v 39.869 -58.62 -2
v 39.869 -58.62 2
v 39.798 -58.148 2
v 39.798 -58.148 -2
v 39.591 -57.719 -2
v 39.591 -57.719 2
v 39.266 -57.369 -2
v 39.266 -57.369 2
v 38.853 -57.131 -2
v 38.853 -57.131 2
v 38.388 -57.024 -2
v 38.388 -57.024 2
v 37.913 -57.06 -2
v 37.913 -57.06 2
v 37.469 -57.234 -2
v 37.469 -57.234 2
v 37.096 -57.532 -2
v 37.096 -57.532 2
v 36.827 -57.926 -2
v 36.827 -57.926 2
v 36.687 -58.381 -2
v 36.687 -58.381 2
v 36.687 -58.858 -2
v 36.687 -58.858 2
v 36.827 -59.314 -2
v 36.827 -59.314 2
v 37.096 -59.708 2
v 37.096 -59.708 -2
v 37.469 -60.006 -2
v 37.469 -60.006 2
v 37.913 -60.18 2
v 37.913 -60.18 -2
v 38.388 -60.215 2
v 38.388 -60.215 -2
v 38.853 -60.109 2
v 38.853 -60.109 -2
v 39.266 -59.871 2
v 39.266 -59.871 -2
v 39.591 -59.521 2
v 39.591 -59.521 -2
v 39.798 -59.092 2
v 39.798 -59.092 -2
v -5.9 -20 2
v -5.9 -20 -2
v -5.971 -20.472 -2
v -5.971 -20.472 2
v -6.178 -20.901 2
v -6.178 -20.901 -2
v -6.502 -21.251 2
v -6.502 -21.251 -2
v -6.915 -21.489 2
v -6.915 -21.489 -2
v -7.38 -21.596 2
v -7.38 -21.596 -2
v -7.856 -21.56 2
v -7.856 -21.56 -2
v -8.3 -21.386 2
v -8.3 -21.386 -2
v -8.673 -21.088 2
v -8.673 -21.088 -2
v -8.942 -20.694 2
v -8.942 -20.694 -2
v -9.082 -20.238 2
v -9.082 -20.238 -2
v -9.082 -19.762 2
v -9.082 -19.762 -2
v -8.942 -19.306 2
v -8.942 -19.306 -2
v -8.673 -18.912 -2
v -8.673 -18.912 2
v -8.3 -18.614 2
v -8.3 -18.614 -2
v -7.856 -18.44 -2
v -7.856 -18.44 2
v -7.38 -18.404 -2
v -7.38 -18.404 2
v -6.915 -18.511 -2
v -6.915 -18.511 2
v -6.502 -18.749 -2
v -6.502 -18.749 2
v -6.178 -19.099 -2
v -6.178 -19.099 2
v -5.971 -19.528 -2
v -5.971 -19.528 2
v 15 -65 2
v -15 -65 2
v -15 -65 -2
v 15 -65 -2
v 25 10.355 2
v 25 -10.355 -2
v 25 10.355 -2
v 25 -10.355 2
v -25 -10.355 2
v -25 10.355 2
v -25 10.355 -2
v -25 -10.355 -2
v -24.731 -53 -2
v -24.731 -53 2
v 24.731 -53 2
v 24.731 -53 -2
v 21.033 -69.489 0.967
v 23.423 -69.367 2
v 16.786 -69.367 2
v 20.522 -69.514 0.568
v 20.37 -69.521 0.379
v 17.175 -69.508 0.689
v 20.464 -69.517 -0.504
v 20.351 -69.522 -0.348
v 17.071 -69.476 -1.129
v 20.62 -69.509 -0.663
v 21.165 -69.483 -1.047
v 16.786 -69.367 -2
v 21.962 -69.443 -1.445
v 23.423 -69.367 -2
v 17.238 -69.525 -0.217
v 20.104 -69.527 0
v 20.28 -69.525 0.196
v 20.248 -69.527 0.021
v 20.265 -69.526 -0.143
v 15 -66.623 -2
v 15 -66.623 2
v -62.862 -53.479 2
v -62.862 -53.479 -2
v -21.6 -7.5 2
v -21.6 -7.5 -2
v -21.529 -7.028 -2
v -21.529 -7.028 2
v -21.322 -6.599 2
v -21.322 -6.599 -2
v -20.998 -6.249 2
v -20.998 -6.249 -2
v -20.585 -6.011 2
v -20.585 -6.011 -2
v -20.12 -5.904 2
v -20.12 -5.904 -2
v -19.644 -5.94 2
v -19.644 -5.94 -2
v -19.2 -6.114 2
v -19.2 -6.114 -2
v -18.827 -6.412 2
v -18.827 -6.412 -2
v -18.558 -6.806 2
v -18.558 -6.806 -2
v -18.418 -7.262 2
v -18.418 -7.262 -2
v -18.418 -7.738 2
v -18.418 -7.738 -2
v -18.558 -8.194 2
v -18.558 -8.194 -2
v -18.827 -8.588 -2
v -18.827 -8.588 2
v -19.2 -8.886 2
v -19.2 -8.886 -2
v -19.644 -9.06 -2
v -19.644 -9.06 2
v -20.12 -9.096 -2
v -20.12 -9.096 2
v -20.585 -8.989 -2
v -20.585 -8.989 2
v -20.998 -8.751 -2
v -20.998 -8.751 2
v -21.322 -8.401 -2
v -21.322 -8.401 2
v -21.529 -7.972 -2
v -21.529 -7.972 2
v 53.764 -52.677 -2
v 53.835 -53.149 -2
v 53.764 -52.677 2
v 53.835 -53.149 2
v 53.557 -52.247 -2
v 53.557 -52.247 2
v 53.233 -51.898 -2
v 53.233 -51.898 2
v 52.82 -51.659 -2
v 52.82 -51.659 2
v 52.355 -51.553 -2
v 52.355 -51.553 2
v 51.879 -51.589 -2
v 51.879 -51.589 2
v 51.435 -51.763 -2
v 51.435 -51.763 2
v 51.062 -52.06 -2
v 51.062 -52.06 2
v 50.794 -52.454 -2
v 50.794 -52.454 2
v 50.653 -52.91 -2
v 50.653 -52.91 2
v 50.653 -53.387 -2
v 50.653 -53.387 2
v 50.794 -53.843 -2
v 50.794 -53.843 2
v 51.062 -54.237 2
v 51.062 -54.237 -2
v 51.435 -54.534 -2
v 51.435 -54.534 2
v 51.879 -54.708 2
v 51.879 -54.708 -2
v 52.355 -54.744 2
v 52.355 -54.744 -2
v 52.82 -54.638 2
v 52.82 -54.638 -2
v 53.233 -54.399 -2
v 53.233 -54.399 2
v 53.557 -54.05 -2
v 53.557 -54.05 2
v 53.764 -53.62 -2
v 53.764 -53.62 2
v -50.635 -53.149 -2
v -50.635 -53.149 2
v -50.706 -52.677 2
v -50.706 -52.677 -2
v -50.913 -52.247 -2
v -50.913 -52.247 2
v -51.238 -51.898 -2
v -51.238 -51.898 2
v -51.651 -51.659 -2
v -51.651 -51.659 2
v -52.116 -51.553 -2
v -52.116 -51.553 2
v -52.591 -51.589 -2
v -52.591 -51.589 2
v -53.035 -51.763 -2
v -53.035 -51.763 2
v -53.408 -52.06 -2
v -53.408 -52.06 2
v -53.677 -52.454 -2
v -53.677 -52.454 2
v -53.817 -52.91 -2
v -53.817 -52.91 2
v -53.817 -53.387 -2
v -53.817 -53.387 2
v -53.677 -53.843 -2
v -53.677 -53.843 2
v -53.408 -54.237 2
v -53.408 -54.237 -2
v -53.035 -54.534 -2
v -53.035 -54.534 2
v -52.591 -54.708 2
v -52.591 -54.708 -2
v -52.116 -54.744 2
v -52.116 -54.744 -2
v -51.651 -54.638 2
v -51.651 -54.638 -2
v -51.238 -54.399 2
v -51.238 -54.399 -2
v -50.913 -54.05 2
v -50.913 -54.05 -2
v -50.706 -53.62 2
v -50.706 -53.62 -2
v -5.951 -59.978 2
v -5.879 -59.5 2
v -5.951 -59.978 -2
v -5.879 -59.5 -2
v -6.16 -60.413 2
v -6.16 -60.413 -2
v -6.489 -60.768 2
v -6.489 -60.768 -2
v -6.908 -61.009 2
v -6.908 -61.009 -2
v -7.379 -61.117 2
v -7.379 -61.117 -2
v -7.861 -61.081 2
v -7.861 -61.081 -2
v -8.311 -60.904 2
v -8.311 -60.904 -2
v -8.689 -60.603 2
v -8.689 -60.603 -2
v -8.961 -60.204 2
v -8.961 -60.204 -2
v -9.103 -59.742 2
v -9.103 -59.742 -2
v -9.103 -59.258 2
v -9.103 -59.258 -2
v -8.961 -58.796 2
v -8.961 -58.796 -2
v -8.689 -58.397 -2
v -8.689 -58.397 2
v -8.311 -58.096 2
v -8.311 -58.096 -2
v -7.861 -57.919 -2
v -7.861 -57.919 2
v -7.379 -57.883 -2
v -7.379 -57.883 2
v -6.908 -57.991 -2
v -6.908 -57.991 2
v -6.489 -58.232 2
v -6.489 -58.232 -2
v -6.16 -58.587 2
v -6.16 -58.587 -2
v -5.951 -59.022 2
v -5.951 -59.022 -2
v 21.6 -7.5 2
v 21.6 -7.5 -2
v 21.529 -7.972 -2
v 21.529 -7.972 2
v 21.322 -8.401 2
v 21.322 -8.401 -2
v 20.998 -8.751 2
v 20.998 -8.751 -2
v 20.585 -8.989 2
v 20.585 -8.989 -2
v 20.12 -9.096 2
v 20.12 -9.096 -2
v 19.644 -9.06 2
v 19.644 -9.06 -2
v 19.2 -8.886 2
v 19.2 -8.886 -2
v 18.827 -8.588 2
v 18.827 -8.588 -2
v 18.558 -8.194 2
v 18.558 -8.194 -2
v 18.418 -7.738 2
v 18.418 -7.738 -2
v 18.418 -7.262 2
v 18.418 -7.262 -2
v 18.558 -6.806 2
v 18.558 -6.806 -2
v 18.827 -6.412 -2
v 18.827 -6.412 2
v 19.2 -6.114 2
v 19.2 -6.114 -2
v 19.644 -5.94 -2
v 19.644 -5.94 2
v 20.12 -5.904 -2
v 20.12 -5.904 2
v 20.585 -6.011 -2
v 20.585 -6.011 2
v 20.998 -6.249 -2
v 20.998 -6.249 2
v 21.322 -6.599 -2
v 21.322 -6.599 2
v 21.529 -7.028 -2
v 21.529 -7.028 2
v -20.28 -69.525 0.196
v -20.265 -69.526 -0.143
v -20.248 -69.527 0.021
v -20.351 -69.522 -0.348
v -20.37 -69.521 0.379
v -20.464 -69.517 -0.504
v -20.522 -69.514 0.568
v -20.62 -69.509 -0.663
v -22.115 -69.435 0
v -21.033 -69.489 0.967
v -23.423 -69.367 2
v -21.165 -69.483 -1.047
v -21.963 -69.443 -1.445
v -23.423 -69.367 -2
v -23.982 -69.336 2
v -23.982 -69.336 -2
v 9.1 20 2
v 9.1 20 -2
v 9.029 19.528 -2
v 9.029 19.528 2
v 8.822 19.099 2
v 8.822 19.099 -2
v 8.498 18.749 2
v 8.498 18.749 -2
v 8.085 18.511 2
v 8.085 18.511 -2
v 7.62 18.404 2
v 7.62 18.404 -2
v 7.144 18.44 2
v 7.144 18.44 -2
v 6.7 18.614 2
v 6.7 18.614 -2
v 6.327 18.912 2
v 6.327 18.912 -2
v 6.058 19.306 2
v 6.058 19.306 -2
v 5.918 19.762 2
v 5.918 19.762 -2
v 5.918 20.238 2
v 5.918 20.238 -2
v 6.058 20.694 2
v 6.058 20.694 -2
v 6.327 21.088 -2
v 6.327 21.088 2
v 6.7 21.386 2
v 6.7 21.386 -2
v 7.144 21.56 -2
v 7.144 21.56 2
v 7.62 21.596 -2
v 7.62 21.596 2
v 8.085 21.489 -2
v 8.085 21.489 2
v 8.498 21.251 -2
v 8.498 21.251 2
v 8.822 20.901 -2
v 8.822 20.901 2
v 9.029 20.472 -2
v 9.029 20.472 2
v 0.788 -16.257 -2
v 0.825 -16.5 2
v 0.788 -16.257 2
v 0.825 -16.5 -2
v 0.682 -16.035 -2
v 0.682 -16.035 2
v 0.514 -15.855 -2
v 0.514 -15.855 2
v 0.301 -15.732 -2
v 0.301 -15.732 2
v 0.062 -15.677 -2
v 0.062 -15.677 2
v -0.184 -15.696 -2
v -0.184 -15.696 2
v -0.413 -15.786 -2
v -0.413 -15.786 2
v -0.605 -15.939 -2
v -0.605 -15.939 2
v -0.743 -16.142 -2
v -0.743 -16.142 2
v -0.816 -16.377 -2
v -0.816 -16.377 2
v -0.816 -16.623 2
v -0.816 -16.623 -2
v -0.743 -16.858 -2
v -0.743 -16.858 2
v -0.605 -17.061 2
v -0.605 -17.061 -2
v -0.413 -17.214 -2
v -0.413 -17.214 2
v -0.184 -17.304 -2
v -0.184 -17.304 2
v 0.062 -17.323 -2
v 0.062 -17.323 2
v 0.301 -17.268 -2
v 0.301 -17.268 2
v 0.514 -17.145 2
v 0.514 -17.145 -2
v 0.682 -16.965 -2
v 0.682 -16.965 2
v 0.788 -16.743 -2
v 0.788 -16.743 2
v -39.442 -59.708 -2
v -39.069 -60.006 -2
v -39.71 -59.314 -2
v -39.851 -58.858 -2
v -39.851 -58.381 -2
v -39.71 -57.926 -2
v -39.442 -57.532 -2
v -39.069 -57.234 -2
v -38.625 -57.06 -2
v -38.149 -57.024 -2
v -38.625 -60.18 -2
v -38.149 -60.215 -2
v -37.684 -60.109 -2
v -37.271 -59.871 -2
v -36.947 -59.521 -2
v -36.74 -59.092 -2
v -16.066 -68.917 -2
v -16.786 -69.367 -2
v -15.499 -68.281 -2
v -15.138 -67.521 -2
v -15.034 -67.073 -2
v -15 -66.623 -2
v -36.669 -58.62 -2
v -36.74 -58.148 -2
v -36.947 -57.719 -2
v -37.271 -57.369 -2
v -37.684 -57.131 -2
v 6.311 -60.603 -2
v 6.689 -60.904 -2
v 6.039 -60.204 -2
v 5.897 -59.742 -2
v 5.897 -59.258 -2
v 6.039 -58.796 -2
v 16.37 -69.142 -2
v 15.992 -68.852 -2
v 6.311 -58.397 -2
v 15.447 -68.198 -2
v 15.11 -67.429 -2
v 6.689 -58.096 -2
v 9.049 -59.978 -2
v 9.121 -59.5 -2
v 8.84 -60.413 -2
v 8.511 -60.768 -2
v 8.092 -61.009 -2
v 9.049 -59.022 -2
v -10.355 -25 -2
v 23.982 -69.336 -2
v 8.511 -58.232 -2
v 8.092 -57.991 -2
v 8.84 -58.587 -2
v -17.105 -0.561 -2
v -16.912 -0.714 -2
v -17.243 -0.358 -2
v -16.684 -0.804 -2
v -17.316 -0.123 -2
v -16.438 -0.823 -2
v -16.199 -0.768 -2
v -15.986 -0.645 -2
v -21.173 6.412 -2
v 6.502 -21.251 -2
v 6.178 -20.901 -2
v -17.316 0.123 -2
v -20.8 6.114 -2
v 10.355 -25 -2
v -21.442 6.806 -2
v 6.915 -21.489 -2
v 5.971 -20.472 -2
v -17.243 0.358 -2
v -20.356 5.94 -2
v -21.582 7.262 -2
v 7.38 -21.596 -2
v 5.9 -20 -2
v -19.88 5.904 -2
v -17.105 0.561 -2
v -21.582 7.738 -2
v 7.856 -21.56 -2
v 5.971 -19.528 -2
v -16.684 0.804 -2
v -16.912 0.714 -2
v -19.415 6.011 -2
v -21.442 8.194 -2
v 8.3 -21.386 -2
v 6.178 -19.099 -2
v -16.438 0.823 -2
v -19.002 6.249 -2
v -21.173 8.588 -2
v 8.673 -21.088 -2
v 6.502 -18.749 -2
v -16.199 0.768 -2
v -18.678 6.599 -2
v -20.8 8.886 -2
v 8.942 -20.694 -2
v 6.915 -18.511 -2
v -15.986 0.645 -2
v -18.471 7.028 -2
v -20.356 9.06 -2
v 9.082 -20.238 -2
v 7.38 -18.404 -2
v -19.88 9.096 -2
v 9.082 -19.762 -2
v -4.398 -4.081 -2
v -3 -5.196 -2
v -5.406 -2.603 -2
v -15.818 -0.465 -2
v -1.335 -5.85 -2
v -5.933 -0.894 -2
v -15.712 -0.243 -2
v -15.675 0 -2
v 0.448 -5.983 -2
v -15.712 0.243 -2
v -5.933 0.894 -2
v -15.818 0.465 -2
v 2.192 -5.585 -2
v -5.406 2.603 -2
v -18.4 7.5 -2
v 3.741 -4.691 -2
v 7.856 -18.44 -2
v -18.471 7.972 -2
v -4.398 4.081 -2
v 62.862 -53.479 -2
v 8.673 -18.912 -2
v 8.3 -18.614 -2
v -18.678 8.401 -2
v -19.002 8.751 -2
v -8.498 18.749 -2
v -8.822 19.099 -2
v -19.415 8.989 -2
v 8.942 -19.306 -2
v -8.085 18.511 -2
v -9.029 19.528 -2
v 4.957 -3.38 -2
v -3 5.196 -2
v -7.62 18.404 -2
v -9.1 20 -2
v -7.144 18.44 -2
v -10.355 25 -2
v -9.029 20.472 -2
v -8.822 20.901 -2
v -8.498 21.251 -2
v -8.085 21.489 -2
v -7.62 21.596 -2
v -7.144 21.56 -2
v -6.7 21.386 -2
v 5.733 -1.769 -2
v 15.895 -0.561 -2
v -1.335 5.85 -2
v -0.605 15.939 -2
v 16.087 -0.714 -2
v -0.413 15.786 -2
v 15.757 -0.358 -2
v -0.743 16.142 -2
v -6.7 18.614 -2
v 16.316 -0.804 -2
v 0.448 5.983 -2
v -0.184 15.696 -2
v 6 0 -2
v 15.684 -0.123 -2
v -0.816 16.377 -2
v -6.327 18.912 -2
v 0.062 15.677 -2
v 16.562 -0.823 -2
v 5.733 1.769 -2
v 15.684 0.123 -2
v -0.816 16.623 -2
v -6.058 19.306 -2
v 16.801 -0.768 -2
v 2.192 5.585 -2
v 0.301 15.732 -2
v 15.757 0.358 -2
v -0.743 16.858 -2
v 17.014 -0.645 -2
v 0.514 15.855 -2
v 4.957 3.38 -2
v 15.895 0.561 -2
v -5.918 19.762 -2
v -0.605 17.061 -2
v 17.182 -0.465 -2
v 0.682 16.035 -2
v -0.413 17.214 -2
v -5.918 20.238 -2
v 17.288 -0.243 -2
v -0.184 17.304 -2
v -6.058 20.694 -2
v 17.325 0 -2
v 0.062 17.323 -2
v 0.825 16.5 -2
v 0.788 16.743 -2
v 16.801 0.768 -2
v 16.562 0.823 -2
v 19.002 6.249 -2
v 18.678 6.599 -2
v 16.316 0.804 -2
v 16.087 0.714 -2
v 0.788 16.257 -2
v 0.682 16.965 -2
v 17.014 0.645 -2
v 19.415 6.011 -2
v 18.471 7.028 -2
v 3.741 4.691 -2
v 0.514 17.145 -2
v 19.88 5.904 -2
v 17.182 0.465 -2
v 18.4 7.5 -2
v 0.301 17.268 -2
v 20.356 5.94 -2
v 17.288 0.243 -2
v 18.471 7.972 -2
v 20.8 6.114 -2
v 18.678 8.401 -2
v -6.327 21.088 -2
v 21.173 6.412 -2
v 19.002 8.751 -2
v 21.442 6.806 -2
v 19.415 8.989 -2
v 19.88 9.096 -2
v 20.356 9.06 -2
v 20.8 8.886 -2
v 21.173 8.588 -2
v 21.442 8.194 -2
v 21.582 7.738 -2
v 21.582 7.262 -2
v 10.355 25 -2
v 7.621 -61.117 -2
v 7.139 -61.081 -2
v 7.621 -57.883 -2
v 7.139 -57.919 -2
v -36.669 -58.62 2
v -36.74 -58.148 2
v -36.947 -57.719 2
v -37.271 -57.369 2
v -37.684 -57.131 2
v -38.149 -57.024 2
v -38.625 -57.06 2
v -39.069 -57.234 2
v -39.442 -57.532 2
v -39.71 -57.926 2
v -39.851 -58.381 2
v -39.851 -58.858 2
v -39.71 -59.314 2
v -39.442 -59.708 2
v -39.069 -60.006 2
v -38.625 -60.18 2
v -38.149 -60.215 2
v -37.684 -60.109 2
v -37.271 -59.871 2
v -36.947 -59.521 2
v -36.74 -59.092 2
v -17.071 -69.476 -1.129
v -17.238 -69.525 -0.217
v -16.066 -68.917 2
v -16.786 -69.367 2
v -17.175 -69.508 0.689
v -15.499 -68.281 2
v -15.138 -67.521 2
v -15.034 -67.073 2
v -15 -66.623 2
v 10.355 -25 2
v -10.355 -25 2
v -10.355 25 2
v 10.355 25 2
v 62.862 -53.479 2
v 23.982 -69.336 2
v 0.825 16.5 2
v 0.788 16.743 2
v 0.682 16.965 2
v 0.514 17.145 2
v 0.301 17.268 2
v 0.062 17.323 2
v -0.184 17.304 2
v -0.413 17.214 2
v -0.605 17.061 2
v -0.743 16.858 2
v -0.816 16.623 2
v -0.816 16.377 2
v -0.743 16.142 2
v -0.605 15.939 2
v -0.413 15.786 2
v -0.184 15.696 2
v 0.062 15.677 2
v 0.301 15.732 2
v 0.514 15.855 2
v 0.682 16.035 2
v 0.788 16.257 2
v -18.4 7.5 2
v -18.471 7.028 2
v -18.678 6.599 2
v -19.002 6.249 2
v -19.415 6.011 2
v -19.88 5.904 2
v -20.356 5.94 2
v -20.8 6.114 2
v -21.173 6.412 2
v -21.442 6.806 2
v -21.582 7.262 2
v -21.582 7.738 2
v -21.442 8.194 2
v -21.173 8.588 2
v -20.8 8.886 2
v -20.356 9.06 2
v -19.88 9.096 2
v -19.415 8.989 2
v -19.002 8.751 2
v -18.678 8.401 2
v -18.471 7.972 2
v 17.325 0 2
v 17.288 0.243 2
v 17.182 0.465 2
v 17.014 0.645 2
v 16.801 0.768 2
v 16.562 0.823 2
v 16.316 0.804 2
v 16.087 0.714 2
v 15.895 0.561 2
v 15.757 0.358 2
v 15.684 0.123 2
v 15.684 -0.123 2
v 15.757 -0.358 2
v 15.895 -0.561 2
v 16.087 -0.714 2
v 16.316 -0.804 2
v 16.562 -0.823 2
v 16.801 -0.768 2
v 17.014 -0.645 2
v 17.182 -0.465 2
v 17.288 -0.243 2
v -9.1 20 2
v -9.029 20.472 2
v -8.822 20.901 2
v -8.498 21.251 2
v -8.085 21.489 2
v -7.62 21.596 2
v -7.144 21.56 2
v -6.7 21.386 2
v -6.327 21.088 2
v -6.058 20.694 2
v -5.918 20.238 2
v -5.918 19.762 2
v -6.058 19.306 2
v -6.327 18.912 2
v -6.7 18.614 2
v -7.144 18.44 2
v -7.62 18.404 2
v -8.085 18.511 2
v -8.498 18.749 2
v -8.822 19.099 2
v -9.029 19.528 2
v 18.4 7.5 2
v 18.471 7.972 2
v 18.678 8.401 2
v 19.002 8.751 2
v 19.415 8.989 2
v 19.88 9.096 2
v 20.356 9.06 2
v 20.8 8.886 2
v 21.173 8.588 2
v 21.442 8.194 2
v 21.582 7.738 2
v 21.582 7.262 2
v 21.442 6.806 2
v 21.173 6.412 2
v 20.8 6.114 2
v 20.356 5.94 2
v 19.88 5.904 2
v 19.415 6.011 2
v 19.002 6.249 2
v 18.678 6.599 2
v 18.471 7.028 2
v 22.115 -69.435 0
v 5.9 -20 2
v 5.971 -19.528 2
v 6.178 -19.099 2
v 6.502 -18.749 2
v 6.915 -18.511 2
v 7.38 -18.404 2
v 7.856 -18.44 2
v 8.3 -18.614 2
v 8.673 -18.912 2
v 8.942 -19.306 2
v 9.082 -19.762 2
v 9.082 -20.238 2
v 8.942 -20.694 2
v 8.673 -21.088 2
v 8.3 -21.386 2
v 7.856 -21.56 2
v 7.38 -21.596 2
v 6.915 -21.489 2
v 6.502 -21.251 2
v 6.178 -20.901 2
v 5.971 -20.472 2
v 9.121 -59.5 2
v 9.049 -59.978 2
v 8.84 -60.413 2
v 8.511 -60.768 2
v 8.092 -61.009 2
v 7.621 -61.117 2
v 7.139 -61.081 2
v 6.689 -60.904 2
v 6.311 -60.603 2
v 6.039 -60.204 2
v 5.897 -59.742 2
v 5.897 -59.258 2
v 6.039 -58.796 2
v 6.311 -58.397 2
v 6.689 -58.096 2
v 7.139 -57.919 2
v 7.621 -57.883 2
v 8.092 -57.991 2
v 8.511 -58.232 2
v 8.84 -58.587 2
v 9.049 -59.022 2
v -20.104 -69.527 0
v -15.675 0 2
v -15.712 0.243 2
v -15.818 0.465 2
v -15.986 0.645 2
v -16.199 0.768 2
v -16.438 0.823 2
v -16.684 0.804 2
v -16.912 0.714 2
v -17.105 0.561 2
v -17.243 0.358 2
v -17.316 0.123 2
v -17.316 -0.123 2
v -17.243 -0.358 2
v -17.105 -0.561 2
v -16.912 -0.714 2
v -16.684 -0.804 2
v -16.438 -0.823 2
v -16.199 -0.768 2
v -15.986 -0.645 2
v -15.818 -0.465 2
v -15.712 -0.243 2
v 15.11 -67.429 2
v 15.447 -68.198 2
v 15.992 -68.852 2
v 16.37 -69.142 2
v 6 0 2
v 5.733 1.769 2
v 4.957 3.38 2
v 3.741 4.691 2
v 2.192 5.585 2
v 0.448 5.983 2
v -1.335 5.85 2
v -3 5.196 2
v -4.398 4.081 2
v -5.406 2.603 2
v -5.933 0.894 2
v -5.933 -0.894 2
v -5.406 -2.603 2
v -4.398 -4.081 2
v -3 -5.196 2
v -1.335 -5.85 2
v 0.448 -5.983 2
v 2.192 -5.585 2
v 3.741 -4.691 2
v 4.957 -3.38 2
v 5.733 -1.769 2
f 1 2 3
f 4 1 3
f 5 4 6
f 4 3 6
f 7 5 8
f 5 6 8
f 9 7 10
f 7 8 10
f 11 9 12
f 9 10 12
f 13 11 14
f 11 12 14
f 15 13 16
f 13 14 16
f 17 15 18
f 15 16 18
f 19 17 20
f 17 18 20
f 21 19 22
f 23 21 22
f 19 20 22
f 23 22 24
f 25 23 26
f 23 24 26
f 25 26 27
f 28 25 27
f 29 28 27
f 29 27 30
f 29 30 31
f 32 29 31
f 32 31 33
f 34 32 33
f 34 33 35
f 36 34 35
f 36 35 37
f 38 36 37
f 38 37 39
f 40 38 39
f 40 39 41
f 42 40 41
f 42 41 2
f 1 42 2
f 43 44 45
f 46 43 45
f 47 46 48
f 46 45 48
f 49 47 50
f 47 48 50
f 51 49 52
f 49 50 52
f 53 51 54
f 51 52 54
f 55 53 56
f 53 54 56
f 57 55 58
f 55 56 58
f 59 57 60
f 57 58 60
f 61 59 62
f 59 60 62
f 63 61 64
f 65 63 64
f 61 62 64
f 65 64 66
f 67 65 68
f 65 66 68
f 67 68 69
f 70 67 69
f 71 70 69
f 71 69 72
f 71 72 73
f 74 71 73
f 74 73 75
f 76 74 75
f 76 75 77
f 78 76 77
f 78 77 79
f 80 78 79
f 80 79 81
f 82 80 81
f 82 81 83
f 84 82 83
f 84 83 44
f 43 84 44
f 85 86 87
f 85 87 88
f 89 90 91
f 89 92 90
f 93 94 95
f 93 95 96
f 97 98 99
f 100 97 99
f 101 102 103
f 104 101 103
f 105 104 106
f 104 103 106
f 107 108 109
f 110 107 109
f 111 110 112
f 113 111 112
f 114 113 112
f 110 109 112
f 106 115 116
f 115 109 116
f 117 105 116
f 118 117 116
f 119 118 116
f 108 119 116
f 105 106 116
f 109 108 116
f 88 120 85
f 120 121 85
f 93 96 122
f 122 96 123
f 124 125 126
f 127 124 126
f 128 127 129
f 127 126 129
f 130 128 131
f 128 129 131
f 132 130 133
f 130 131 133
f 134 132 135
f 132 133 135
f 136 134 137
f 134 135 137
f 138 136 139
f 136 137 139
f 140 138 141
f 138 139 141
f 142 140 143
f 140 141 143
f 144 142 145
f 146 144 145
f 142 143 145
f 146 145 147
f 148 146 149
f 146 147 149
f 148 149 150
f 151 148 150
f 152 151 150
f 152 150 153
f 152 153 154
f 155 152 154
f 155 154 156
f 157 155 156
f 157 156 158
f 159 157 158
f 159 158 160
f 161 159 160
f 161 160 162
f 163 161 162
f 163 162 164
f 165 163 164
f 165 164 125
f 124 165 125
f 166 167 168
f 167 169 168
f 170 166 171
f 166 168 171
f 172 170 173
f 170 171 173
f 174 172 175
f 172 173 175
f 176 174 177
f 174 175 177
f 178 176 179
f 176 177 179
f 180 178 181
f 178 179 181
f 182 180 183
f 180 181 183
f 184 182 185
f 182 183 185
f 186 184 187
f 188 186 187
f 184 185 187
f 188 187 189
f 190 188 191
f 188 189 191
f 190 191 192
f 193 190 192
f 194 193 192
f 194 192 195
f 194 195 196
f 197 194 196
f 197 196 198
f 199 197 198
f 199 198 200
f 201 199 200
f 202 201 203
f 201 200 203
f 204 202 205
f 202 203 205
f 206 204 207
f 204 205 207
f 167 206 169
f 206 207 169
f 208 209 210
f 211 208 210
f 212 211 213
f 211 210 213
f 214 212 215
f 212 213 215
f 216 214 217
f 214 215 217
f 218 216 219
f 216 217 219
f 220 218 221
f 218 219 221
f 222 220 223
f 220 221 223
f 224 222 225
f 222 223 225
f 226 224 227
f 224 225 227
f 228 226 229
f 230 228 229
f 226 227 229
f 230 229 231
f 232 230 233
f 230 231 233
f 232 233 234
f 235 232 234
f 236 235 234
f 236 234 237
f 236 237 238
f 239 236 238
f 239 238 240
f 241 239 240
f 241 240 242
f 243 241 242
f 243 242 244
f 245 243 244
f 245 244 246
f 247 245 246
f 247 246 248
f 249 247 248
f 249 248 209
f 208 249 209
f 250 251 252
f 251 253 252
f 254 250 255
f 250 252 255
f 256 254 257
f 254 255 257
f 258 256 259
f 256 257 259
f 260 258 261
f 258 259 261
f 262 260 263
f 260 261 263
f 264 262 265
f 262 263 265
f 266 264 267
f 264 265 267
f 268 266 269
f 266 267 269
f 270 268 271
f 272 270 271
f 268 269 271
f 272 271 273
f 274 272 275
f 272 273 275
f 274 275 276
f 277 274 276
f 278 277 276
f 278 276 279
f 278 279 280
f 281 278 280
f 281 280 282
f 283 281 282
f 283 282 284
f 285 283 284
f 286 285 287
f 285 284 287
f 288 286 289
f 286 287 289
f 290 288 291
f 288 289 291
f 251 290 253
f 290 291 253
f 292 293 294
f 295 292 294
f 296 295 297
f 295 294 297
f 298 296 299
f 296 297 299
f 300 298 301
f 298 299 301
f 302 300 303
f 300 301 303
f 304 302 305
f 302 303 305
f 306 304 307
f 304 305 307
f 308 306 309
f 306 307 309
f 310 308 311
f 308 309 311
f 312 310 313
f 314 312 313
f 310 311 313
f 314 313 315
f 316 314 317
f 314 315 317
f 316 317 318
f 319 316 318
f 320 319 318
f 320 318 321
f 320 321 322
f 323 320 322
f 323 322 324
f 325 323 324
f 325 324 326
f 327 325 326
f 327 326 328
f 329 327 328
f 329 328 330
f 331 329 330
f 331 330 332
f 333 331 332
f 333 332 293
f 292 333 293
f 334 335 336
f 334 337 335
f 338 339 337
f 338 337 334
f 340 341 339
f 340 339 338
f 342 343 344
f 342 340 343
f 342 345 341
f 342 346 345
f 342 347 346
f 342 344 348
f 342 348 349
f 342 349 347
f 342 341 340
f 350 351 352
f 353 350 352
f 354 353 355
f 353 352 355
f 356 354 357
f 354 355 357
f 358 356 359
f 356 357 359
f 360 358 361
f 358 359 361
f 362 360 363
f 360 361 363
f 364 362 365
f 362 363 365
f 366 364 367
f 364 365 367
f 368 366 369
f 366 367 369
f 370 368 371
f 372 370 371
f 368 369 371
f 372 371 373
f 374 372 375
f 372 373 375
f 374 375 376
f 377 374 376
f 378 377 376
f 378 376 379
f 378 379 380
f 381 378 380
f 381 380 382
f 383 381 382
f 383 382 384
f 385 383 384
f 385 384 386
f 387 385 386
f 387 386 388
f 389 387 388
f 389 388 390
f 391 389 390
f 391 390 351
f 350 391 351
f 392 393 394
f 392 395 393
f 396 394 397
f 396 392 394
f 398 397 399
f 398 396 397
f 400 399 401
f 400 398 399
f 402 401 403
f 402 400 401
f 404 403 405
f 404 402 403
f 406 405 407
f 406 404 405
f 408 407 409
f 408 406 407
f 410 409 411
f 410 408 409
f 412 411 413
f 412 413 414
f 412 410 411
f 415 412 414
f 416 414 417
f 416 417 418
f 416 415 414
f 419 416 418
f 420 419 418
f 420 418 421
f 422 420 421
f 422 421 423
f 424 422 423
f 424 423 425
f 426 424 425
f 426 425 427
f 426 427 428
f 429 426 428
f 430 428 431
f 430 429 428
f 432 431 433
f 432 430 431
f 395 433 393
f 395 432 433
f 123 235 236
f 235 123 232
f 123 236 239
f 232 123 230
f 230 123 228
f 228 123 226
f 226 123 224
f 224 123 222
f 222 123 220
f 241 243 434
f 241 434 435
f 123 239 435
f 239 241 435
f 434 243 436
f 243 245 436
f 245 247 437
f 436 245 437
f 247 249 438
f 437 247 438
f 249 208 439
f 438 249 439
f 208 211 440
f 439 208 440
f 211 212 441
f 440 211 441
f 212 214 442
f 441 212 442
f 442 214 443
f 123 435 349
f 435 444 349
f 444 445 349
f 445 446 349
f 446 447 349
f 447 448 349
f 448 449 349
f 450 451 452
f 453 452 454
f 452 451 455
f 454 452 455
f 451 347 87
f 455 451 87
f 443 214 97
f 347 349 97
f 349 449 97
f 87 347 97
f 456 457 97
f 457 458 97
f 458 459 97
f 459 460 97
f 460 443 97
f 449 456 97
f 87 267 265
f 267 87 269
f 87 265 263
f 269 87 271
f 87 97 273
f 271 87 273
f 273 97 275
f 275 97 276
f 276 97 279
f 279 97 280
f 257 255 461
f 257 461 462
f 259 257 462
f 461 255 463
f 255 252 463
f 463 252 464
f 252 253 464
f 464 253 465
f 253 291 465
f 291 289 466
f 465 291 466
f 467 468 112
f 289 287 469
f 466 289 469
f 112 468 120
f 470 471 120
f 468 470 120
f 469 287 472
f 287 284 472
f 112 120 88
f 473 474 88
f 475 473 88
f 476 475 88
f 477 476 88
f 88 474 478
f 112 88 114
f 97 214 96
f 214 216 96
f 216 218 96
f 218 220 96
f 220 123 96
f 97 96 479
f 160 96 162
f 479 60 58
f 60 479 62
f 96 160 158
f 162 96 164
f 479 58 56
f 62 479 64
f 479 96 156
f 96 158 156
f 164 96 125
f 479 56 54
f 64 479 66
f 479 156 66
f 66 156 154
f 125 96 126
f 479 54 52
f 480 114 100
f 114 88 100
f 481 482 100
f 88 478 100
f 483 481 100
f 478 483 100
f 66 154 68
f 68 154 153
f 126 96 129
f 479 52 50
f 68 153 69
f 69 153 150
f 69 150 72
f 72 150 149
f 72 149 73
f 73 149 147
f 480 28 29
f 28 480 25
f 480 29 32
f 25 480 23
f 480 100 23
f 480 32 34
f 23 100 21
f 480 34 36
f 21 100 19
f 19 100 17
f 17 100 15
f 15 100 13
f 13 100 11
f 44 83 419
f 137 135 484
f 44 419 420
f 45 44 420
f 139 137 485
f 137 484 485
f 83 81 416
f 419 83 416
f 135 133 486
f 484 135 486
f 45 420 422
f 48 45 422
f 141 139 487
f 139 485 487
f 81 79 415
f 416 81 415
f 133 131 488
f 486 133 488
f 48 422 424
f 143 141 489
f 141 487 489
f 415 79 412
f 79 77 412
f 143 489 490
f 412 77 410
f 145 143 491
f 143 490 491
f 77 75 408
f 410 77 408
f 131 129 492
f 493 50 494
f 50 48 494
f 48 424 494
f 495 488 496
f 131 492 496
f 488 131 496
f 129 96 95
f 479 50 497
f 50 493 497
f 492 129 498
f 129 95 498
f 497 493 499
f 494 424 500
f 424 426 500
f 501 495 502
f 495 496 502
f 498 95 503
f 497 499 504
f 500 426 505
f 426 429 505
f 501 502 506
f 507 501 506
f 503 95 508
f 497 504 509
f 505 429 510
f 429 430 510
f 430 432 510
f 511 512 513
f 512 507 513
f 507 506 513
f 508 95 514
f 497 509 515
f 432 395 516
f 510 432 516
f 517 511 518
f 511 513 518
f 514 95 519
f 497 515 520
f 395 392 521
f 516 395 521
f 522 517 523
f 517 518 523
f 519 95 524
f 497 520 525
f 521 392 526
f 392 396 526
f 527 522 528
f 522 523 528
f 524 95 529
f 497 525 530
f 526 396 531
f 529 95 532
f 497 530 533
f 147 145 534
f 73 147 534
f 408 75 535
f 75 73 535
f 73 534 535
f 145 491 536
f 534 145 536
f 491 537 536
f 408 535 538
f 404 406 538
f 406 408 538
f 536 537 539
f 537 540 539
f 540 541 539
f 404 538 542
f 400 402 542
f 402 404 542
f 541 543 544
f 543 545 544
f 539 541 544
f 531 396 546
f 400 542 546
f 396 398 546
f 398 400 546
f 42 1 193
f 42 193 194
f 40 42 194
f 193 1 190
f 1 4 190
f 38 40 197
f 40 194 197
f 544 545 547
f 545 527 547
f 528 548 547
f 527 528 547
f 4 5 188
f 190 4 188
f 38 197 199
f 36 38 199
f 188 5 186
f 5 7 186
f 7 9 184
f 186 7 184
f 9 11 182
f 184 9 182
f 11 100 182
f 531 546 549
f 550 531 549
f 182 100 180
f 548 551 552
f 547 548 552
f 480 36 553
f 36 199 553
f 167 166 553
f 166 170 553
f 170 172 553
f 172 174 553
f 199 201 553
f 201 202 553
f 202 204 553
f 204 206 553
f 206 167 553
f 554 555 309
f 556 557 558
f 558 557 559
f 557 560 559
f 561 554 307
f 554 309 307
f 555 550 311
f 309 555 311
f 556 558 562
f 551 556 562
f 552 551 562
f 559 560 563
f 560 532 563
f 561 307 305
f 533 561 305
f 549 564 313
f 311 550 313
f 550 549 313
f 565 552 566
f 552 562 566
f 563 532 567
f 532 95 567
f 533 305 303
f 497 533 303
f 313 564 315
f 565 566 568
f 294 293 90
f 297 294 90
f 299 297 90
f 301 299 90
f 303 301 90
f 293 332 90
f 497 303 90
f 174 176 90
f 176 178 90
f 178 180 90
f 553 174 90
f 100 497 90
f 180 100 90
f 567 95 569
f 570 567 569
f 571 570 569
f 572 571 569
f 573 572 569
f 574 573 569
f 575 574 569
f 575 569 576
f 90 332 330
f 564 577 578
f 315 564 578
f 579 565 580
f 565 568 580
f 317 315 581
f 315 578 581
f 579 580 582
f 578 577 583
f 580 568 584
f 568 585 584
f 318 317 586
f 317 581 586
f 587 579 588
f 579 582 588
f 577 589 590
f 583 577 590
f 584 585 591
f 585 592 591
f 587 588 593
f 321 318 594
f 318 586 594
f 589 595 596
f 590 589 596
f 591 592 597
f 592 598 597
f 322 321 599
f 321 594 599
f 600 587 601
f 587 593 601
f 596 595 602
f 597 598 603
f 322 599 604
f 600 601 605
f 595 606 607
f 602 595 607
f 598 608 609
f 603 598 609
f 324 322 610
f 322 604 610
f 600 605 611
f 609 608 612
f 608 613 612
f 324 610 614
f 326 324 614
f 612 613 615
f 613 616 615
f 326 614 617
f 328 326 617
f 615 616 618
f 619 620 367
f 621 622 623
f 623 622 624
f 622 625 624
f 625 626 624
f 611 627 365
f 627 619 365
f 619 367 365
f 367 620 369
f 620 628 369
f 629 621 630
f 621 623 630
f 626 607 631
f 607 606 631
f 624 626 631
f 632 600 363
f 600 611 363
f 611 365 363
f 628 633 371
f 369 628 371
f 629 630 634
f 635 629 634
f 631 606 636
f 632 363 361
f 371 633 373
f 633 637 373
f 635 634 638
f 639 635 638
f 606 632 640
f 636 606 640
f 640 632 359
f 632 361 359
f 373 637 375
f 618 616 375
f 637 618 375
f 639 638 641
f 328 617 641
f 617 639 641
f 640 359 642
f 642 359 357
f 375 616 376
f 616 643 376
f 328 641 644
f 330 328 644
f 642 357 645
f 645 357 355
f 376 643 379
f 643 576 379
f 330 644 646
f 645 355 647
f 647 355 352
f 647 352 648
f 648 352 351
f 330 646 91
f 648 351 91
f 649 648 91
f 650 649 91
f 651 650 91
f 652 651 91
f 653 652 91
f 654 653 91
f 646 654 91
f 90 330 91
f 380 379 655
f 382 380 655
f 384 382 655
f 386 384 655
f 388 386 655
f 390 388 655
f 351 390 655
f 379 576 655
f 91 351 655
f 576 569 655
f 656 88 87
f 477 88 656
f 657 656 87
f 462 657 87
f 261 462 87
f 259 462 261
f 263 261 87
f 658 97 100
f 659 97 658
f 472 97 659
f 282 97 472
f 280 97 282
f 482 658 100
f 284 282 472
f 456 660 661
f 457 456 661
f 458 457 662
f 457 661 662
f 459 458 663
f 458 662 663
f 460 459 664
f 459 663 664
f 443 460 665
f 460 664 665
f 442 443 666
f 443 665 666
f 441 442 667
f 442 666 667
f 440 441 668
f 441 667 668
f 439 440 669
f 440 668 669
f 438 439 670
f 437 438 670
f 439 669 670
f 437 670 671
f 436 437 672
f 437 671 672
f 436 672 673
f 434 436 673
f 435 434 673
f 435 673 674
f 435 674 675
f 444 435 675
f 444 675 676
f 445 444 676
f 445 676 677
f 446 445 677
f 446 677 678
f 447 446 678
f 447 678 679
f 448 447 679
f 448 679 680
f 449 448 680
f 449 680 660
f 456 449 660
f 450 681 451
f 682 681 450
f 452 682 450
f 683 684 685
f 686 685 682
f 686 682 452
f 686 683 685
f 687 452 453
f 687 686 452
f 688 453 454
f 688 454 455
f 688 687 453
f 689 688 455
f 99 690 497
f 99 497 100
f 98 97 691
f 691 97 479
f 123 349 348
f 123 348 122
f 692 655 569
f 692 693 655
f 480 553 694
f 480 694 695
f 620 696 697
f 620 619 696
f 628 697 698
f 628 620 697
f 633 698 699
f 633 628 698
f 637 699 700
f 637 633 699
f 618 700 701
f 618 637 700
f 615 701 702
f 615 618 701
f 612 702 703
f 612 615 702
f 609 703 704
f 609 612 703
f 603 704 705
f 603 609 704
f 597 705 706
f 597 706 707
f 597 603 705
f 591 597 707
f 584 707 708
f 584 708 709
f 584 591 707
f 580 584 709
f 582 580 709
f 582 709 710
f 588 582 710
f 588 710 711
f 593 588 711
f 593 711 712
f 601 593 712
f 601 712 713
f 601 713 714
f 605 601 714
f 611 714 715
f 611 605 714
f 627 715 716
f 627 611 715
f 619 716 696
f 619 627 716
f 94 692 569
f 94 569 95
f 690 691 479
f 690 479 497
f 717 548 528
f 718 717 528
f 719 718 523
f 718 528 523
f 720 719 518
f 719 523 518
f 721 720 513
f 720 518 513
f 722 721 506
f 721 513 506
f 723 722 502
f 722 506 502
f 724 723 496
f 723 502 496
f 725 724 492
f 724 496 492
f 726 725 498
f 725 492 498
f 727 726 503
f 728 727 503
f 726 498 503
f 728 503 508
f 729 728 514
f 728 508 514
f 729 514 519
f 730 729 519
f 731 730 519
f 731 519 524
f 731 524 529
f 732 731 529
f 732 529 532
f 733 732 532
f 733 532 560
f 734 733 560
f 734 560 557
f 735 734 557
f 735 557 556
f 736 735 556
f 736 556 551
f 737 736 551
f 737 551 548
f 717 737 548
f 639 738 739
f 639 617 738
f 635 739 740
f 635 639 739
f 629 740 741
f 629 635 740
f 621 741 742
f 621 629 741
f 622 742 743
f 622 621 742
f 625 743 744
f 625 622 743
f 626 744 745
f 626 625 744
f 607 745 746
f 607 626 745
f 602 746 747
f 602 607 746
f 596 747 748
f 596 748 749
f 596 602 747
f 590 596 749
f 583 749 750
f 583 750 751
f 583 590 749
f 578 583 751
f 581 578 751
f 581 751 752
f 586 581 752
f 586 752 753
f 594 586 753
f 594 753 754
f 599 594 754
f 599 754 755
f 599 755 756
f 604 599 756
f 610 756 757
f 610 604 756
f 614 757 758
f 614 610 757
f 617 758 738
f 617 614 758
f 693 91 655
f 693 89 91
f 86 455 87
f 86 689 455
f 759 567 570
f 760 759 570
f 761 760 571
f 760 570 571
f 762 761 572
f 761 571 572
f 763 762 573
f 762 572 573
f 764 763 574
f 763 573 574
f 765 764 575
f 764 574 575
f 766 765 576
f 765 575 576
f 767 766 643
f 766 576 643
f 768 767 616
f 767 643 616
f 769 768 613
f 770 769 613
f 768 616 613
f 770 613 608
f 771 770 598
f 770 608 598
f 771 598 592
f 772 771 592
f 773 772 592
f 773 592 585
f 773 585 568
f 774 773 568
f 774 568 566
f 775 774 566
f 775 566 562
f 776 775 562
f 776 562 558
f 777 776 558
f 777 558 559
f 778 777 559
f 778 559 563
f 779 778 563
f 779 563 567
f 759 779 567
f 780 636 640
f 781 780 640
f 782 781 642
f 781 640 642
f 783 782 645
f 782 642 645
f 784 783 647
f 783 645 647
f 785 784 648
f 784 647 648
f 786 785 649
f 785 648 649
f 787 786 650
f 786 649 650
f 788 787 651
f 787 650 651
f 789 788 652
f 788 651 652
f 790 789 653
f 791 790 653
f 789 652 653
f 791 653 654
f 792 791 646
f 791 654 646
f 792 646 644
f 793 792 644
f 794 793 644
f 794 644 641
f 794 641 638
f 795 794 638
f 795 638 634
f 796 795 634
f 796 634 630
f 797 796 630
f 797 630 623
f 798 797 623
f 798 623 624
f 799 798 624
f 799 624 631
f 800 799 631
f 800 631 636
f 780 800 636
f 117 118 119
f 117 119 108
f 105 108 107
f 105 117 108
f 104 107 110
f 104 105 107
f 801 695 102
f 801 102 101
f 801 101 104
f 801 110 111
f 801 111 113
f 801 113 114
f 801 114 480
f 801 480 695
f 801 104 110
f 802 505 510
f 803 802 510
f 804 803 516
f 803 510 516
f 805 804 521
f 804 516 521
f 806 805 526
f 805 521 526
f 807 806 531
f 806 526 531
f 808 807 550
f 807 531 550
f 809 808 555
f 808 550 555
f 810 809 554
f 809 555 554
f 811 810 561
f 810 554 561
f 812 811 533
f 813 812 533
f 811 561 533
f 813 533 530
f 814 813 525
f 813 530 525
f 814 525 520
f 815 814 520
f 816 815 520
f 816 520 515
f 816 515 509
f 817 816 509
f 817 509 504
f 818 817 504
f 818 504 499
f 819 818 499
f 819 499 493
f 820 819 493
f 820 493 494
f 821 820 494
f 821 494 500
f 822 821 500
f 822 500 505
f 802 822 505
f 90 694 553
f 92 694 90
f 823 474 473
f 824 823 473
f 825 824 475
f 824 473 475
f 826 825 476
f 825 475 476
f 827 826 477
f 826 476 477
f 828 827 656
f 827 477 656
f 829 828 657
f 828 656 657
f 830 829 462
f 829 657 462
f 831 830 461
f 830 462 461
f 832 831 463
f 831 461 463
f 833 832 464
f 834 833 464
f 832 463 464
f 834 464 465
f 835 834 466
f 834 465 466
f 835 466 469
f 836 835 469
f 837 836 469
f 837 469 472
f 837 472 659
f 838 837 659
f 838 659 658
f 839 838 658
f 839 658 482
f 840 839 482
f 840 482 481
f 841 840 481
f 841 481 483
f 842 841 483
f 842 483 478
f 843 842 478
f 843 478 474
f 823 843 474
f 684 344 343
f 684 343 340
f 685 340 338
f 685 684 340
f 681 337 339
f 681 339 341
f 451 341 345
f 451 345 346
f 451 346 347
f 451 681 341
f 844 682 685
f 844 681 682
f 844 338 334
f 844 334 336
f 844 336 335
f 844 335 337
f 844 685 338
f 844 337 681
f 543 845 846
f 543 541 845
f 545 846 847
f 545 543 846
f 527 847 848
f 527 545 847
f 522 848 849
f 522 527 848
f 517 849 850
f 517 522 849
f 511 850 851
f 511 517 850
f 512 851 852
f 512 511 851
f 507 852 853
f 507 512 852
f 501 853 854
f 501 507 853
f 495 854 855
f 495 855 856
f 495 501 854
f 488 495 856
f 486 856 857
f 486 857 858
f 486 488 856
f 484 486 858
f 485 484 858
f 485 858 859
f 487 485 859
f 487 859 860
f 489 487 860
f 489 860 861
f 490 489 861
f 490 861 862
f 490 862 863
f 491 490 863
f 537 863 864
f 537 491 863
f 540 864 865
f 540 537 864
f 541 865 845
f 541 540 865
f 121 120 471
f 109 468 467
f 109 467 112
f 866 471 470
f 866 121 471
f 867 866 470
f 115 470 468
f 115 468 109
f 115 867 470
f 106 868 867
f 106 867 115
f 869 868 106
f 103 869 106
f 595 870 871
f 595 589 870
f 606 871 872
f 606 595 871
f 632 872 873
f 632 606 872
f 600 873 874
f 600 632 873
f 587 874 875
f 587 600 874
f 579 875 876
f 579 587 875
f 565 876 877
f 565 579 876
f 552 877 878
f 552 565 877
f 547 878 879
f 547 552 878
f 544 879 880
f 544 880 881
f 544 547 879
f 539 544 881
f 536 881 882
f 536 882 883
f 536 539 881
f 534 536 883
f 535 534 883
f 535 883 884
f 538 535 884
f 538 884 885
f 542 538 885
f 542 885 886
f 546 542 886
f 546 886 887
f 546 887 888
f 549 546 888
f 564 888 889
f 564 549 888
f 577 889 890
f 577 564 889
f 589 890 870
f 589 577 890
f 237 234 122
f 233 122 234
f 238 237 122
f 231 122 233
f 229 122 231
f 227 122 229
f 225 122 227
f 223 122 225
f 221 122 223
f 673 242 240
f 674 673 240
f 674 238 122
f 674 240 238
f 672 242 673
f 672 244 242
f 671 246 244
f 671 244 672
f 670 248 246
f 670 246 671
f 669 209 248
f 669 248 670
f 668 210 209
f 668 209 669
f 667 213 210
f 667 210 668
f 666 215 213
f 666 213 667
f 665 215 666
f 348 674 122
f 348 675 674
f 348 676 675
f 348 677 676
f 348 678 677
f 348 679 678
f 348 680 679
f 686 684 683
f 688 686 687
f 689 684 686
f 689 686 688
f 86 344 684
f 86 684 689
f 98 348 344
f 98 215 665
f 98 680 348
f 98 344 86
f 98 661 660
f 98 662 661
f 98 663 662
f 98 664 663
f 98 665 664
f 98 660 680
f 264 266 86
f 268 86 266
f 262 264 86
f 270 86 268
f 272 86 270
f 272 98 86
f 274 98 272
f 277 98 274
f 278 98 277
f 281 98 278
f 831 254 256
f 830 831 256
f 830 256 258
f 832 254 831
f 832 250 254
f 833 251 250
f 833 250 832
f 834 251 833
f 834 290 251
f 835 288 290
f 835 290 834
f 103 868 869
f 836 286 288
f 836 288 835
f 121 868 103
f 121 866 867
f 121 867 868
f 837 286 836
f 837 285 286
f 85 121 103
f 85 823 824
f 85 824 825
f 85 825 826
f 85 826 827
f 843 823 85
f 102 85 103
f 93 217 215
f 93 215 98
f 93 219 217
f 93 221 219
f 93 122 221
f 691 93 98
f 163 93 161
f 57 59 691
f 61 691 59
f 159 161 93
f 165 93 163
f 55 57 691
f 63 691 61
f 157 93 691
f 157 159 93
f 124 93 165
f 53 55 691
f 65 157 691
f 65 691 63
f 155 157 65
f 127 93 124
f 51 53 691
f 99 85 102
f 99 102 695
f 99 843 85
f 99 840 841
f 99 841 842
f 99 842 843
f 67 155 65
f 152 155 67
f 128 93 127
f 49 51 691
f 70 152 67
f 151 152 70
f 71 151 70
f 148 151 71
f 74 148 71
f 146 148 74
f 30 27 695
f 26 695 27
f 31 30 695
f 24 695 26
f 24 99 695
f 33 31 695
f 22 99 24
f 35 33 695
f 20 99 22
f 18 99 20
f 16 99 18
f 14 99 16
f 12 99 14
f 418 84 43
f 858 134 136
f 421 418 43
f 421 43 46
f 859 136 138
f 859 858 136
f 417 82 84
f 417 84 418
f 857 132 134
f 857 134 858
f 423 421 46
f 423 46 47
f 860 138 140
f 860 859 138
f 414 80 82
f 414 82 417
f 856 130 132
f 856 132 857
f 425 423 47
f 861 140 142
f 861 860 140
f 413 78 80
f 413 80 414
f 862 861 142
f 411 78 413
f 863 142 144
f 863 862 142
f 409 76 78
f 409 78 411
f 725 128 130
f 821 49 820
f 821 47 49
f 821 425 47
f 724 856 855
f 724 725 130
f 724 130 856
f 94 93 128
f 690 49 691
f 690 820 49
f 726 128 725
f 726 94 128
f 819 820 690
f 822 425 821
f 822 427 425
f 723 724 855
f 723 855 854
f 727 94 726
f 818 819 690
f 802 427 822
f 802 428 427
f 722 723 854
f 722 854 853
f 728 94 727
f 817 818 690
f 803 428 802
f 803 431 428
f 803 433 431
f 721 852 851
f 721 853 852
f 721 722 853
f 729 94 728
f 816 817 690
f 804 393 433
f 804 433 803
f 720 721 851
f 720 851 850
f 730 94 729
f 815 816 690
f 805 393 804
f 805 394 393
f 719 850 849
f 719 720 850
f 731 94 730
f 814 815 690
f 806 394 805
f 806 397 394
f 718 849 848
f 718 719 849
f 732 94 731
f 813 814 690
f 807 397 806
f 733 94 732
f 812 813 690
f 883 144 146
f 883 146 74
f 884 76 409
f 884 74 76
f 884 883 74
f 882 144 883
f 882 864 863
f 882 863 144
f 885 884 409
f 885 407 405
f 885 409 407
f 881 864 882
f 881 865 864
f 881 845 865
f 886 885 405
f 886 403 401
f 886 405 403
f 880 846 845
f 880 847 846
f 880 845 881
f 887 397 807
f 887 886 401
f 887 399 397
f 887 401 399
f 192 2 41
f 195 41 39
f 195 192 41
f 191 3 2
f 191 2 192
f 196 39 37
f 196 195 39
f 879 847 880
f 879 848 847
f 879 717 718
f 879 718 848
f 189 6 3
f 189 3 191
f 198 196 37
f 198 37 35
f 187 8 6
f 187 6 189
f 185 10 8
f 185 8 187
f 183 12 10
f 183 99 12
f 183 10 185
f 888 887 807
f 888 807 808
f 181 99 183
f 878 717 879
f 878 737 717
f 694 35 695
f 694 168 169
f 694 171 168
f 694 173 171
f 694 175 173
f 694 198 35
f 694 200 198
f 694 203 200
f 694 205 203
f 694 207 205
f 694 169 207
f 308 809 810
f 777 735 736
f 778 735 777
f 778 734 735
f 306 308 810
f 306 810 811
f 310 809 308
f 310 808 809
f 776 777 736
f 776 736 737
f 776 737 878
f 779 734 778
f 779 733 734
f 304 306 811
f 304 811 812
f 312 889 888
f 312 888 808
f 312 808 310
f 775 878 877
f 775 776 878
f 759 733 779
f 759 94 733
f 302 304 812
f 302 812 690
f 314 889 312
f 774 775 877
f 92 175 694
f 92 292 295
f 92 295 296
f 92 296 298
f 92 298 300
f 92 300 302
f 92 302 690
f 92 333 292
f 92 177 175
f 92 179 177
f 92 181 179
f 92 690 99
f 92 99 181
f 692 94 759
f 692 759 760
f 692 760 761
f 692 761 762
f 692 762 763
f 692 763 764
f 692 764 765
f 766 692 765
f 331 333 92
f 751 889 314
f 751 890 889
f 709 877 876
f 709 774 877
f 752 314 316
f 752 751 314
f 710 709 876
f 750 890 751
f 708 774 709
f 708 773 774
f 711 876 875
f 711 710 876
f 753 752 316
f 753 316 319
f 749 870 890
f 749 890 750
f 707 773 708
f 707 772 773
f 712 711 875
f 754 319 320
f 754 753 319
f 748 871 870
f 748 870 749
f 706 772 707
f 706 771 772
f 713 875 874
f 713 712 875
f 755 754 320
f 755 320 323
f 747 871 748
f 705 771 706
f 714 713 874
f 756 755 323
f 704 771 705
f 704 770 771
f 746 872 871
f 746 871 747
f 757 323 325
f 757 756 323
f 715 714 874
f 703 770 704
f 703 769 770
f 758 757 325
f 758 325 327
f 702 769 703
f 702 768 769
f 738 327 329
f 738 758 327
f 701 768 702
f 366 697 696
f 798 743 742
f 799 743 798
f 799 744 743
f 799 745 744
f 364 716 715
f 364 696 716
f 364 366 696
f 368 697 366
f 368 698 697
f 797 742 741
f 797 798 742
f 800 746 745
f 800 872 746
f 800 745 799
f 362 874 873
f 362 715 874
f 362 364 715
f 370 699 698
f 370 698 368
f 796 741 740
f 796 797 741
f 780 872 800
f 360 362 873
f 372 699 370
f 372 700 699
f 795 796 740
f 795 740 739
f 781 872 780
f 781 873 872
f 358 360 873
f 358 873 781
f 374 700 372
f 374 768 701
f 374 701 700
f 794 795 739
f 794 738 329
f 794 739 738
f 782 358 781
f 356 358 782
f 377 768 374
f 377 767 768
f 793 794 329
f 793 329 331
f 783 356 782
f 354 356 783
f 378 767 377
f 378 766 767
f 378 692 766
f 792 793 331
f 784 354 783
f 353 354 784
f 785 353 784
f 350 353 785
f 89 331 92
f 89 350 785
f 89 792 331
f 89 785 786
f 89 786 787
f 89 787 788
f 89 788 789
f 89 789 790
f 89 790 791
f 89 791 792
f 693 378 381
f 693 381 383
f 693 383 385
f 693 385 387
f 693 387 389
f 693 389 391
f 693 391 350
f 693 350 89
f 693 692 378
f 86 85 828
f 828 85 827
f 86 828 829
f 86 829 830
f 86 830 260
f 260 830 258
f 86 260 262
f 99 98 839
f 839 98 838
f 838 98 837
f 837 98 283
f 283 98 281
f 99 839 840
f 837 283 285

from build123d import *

# Parameters (mm, degrees)
SKETCH_2_R           = 0.825
SKETCH_2_R_2         = 6
EXTRUDE_1_DEPTH      = 2
SKETCH_4_R           = 1.6
CUT_EXTRUDE_1_DEPTH  = 15
EXTRUDE_2_DEPTH      = 2
EXTRUDE_3_DEPTH      = 2
SKETCH_21_W          = 94.174920184
SKETCH_21_H          = 20
EXTRUDE_5_DEPTH      = 4
CUT_EXTRUDE_10_DEPTH = 7
SKETCH_23_W          = 30
SKETCH_23_H          = 8.450093073
CUT_EXTRUDE_11_DEPTH = 7
CHAMFER_START        = -2
CHAMFER_6_DEPTH      = 4
SKETCH_25_R          = 1.6
CUT_EXTRUDE_12_DEPTH = 7
FILLET_3_R           = 3
CUT_EXTRUDE_13_DEPTH = 32
SKETCH_27_R          = 1.621448002
CUT_EXTRUDE_14_DEPTH = 32


with BuildPart() as part:
    # 草图2 → 凸台-拉伸1 (new, symmetric)
    with BuildSketch(Plane.XY):
        Polygon((10.355339059, 25), (-10.355339059, 25), (-25, 10.355339059), (-25, -10.355339059), (-10.355339059, -25), (10.355339059, -25), (25, -10.355339059), (25, 10.355339059), align=None)
        with Locations((-16.5, 0)):
            Circle(SKETCH_2_R, mode=Mode.SUBTRACT)
        with Locations((0, 16.5)):
            Circle(SKETCH_2_R, mode=Mode.SUBTRACT)
        with Locations((16.5, 0)):
            Circle(SKETCH_2_R, mode=Mode.SUBTRACT)
        with Locations((0, -16.5)):
            Circle(SKETCH_2_R, mode=Mode.SUBTRACT)
        Circle(SKETCH_2_R_2, mode=Mode.SUBTRACT)
    extrude(amount=EXTRUDE_1_DEPTH, both=True)

    # 草图4 → 切除-拉伸1 (cut)
    with BuildSketch(Plane(origin=(0, 0, -2), x_dir=(-1, 0, 0), z_dir=(0, 0, -1))):
        with Locations((-7.5, -20)):
            Circle(SKETCH_4_R)
        with Locations(Location((7.5, -20, 0), (0, 0, 180))):
            Circle(SKETCH_4_R)
        with Locations((-20, 7.5)):
            Circle(SKETCH_4_R)
        with Locations(Location((-20, -7.5, 0), (0, 0, 180))):
            Circle(SKETCH_4_R)
        with Locations((7.5, 20)):
            Circle(SKETCH_4_R)
        with Locations(Location((-7.5, 20, 0), (0, 0, 180))):
            Circle(SKETCH_4_R)
        with Locations((20, -7.5)):
            Circle(SKETCH_4_R)
        with Locations(Location((20, 7.5, 0), (0, 0, 180))):
            Circle(SKETCH_4_R)
    extrude(amount=-CUT_EXTRUDE_1_DEPTH, mode=Mode.SUBTRACT)

    # 草图5 → 凸台-拉伸2 (add, symmetric)
    with BuildSketch(Plane.XY):
        Polygon((-25, -10.355339059), (-80, -73), (-60, -73), (-11.17766953, -24.17766953), align=None)
        Polygon((60, -73), (80, -73), (25, -10.355339059), (11.17766953, -24.17766953), align=None)
    extrude(amount=EXTRUDE_2_DEPTH, both=True)

    # 草图6 → 凸台-拉伸3 (add, symmetric)
    with BuildSketch(Plane.XY):
        Polygon((-60, -73), (-35, -73), (-10.355339059, -25), (-11.17766953, -24.17766953), align=None)
        Polygon((60, -73), (11.17766953, -24.17766953), (10.355339059, -25), (35, -73), align=None)
    extrude(amount=EXTRUDE_3_DEPTH, both=True)

    # 草图21 → 凸台-拉伸5 (add)
    with BuildSketch(Plane.XY.offset(2)):
        with Locations((0, -63)):
            Rectangle(SKETCH_21_W, SKETCH_21_H)
    extrude(amount=-EXTRUDE_5_DEPTH)

    # 草图22 → 切除-拉伸10 (cut, symmetric)
    with BuildSketch(Plane.XY.offset(2)):
        with BuildLine():
            Line((-72.098289103, -64), (-93.602322684, -86.771790357))
            Line((-93.602322684, -86.771790357), (107.138572214, -85.642128596))
            Line((107.138572214, -85.642128596), (72.098289103, -64))
            add(Edge.make_bspline(
                [(-72.098289103, -64), (0, -76), (72.098289103, -64)],
                knots=[0, 0, 0, 1, 1, 1], degree=2))
        make_face()
    extrude(amount=CUT_EXTRUDE_10_DEPTH, both=True, mode=Mode.SUBTRACT)

    # 草图23 → 切除-拉伸11 (cut, symmetric)
    with BuildSketch(Plane.XY.offset(2)):
        with Locations((0, -69.225046537)):
            Rectangle(SKETCH_23_W, SKETCH_23_H)
    extrude(amount=CUT_EXTRUDE_11_DEPTH, both=True, mode=Mode.SUBTRACT)

    # 倒角6: read off the stored shape, not the designer's step
    # 倒角6 outline → 倒角6 (cut)
    with BuildSketch(Plane.XY.offset(CHAMFER_START)):
        with BuildLine():
            Line((72.098289103, -64), (62.861553298, -53.47941486))
            Line((62.861553298, -53.47941486), (23.982189464, -69.336136194))
            add(Edge.make_bspline(
                [(72.098289103, -64), (48.040239283, -68.004208719), (23.982189464, -69.336136194)],
                knots=[0, 0, 0, 0.33368406, 0.33368406, 0.33368406], degree=2))
        make_face()
        with BuildLine():
            Line((-23.982189464, -69.336136194), (-62.861553298, -53.47941486))
            Line((-62.861553298, -53.47941486), (-72.098289103, -64))
            add(Edge.make_bspline(
                [(-23.982189464, -69.336136194), (-48.040239283, -68.004208719), (-72.098289103, -64)],
                knots=[0.66631594, 0.66631594, 0.66631594, 1, 1, 1], degree=2))
        make_face()
    extrude(amount=CHAMFER_6_DEPTH, mode=Mode.SUBTRACT)

    # 草图25 → 切除-拉伸12 (cut, symmetric)
    with BuildSketch(Plane.XY.offset(2)):
        with Locations((-52.235249282, -53.148500686)):
            Circle(SKETCH_25_R)
        with Locations((-38.268733006, -58.619919434)):
            Circle(SKETCH_25_R)
        with Locations((38.268733006, -58.619919434)):
            Circle(SKETCH_25_R)
        with Locations((52.235249282, -53.148500686)):
            Circle(SKETCH_25_R)
    extrude(amount=CUT_EXTRUDE_12_DEPTH, both=True, mode=Mode.SUBTRACT)

    # 圆角3
    fillet_3_edges = [part.edges().sort_by_distance(p)[0] for p in [
        (-15, -69.740292883, -3e-07),
        (15, -69.740292883, -3e-07),
    ]]
    fillet(fillet_3_edges, radius=FILLET_3_R)

    # 草图26 → 切除-拉伸13 (cut, symmetric)
    with BuildSketch(Plane(origin=(0, 0, 0), x_dir=(0, 0, -1), z_dir=(1, 0, 0))):
        with BuildLine():
            Line((-2, -69.366736418), (-2.263749967, -70.210945681))
            Line((-2.263749967, -70.210945681), (2.547301332, -70.18897741))
            Line((2.547301332, -70.18897741), (2, -69.366736418))
            add(Edge.make_bspline(
                [(-2, -69.366736418), (0, -69.686845507), (2, -69.366736418)],
                knots=[0, 0, 0, 1, 1, 1], degree=2))
        make_face()
    extrude(amount=CUT_EXTRUDE_13_DEPTH, both=True, mode=Mode.SUBTRACT)

    # 草图27 → 切除-拉伸14 (cut, symmetric)
    with BuildSketch(Plane(origin=(0, 0, -2), x_dir=(-1, 0, 0), z_dir=(0, 0, -1))):
        with Locations(Location((-7.5, -59.5, 0), (0, 0, 180))):
            Circle(SKETCH_27_R)
        with Locations(Location((7.5, -59.5, 0), (0, 0, 180))):
            Circle(SKETCH_27_R)
    extrude(amount=CUT_EXTRUDE_14_DEPTH, both=True, mode=Mode.SUBTRACT)


solid = part.part
